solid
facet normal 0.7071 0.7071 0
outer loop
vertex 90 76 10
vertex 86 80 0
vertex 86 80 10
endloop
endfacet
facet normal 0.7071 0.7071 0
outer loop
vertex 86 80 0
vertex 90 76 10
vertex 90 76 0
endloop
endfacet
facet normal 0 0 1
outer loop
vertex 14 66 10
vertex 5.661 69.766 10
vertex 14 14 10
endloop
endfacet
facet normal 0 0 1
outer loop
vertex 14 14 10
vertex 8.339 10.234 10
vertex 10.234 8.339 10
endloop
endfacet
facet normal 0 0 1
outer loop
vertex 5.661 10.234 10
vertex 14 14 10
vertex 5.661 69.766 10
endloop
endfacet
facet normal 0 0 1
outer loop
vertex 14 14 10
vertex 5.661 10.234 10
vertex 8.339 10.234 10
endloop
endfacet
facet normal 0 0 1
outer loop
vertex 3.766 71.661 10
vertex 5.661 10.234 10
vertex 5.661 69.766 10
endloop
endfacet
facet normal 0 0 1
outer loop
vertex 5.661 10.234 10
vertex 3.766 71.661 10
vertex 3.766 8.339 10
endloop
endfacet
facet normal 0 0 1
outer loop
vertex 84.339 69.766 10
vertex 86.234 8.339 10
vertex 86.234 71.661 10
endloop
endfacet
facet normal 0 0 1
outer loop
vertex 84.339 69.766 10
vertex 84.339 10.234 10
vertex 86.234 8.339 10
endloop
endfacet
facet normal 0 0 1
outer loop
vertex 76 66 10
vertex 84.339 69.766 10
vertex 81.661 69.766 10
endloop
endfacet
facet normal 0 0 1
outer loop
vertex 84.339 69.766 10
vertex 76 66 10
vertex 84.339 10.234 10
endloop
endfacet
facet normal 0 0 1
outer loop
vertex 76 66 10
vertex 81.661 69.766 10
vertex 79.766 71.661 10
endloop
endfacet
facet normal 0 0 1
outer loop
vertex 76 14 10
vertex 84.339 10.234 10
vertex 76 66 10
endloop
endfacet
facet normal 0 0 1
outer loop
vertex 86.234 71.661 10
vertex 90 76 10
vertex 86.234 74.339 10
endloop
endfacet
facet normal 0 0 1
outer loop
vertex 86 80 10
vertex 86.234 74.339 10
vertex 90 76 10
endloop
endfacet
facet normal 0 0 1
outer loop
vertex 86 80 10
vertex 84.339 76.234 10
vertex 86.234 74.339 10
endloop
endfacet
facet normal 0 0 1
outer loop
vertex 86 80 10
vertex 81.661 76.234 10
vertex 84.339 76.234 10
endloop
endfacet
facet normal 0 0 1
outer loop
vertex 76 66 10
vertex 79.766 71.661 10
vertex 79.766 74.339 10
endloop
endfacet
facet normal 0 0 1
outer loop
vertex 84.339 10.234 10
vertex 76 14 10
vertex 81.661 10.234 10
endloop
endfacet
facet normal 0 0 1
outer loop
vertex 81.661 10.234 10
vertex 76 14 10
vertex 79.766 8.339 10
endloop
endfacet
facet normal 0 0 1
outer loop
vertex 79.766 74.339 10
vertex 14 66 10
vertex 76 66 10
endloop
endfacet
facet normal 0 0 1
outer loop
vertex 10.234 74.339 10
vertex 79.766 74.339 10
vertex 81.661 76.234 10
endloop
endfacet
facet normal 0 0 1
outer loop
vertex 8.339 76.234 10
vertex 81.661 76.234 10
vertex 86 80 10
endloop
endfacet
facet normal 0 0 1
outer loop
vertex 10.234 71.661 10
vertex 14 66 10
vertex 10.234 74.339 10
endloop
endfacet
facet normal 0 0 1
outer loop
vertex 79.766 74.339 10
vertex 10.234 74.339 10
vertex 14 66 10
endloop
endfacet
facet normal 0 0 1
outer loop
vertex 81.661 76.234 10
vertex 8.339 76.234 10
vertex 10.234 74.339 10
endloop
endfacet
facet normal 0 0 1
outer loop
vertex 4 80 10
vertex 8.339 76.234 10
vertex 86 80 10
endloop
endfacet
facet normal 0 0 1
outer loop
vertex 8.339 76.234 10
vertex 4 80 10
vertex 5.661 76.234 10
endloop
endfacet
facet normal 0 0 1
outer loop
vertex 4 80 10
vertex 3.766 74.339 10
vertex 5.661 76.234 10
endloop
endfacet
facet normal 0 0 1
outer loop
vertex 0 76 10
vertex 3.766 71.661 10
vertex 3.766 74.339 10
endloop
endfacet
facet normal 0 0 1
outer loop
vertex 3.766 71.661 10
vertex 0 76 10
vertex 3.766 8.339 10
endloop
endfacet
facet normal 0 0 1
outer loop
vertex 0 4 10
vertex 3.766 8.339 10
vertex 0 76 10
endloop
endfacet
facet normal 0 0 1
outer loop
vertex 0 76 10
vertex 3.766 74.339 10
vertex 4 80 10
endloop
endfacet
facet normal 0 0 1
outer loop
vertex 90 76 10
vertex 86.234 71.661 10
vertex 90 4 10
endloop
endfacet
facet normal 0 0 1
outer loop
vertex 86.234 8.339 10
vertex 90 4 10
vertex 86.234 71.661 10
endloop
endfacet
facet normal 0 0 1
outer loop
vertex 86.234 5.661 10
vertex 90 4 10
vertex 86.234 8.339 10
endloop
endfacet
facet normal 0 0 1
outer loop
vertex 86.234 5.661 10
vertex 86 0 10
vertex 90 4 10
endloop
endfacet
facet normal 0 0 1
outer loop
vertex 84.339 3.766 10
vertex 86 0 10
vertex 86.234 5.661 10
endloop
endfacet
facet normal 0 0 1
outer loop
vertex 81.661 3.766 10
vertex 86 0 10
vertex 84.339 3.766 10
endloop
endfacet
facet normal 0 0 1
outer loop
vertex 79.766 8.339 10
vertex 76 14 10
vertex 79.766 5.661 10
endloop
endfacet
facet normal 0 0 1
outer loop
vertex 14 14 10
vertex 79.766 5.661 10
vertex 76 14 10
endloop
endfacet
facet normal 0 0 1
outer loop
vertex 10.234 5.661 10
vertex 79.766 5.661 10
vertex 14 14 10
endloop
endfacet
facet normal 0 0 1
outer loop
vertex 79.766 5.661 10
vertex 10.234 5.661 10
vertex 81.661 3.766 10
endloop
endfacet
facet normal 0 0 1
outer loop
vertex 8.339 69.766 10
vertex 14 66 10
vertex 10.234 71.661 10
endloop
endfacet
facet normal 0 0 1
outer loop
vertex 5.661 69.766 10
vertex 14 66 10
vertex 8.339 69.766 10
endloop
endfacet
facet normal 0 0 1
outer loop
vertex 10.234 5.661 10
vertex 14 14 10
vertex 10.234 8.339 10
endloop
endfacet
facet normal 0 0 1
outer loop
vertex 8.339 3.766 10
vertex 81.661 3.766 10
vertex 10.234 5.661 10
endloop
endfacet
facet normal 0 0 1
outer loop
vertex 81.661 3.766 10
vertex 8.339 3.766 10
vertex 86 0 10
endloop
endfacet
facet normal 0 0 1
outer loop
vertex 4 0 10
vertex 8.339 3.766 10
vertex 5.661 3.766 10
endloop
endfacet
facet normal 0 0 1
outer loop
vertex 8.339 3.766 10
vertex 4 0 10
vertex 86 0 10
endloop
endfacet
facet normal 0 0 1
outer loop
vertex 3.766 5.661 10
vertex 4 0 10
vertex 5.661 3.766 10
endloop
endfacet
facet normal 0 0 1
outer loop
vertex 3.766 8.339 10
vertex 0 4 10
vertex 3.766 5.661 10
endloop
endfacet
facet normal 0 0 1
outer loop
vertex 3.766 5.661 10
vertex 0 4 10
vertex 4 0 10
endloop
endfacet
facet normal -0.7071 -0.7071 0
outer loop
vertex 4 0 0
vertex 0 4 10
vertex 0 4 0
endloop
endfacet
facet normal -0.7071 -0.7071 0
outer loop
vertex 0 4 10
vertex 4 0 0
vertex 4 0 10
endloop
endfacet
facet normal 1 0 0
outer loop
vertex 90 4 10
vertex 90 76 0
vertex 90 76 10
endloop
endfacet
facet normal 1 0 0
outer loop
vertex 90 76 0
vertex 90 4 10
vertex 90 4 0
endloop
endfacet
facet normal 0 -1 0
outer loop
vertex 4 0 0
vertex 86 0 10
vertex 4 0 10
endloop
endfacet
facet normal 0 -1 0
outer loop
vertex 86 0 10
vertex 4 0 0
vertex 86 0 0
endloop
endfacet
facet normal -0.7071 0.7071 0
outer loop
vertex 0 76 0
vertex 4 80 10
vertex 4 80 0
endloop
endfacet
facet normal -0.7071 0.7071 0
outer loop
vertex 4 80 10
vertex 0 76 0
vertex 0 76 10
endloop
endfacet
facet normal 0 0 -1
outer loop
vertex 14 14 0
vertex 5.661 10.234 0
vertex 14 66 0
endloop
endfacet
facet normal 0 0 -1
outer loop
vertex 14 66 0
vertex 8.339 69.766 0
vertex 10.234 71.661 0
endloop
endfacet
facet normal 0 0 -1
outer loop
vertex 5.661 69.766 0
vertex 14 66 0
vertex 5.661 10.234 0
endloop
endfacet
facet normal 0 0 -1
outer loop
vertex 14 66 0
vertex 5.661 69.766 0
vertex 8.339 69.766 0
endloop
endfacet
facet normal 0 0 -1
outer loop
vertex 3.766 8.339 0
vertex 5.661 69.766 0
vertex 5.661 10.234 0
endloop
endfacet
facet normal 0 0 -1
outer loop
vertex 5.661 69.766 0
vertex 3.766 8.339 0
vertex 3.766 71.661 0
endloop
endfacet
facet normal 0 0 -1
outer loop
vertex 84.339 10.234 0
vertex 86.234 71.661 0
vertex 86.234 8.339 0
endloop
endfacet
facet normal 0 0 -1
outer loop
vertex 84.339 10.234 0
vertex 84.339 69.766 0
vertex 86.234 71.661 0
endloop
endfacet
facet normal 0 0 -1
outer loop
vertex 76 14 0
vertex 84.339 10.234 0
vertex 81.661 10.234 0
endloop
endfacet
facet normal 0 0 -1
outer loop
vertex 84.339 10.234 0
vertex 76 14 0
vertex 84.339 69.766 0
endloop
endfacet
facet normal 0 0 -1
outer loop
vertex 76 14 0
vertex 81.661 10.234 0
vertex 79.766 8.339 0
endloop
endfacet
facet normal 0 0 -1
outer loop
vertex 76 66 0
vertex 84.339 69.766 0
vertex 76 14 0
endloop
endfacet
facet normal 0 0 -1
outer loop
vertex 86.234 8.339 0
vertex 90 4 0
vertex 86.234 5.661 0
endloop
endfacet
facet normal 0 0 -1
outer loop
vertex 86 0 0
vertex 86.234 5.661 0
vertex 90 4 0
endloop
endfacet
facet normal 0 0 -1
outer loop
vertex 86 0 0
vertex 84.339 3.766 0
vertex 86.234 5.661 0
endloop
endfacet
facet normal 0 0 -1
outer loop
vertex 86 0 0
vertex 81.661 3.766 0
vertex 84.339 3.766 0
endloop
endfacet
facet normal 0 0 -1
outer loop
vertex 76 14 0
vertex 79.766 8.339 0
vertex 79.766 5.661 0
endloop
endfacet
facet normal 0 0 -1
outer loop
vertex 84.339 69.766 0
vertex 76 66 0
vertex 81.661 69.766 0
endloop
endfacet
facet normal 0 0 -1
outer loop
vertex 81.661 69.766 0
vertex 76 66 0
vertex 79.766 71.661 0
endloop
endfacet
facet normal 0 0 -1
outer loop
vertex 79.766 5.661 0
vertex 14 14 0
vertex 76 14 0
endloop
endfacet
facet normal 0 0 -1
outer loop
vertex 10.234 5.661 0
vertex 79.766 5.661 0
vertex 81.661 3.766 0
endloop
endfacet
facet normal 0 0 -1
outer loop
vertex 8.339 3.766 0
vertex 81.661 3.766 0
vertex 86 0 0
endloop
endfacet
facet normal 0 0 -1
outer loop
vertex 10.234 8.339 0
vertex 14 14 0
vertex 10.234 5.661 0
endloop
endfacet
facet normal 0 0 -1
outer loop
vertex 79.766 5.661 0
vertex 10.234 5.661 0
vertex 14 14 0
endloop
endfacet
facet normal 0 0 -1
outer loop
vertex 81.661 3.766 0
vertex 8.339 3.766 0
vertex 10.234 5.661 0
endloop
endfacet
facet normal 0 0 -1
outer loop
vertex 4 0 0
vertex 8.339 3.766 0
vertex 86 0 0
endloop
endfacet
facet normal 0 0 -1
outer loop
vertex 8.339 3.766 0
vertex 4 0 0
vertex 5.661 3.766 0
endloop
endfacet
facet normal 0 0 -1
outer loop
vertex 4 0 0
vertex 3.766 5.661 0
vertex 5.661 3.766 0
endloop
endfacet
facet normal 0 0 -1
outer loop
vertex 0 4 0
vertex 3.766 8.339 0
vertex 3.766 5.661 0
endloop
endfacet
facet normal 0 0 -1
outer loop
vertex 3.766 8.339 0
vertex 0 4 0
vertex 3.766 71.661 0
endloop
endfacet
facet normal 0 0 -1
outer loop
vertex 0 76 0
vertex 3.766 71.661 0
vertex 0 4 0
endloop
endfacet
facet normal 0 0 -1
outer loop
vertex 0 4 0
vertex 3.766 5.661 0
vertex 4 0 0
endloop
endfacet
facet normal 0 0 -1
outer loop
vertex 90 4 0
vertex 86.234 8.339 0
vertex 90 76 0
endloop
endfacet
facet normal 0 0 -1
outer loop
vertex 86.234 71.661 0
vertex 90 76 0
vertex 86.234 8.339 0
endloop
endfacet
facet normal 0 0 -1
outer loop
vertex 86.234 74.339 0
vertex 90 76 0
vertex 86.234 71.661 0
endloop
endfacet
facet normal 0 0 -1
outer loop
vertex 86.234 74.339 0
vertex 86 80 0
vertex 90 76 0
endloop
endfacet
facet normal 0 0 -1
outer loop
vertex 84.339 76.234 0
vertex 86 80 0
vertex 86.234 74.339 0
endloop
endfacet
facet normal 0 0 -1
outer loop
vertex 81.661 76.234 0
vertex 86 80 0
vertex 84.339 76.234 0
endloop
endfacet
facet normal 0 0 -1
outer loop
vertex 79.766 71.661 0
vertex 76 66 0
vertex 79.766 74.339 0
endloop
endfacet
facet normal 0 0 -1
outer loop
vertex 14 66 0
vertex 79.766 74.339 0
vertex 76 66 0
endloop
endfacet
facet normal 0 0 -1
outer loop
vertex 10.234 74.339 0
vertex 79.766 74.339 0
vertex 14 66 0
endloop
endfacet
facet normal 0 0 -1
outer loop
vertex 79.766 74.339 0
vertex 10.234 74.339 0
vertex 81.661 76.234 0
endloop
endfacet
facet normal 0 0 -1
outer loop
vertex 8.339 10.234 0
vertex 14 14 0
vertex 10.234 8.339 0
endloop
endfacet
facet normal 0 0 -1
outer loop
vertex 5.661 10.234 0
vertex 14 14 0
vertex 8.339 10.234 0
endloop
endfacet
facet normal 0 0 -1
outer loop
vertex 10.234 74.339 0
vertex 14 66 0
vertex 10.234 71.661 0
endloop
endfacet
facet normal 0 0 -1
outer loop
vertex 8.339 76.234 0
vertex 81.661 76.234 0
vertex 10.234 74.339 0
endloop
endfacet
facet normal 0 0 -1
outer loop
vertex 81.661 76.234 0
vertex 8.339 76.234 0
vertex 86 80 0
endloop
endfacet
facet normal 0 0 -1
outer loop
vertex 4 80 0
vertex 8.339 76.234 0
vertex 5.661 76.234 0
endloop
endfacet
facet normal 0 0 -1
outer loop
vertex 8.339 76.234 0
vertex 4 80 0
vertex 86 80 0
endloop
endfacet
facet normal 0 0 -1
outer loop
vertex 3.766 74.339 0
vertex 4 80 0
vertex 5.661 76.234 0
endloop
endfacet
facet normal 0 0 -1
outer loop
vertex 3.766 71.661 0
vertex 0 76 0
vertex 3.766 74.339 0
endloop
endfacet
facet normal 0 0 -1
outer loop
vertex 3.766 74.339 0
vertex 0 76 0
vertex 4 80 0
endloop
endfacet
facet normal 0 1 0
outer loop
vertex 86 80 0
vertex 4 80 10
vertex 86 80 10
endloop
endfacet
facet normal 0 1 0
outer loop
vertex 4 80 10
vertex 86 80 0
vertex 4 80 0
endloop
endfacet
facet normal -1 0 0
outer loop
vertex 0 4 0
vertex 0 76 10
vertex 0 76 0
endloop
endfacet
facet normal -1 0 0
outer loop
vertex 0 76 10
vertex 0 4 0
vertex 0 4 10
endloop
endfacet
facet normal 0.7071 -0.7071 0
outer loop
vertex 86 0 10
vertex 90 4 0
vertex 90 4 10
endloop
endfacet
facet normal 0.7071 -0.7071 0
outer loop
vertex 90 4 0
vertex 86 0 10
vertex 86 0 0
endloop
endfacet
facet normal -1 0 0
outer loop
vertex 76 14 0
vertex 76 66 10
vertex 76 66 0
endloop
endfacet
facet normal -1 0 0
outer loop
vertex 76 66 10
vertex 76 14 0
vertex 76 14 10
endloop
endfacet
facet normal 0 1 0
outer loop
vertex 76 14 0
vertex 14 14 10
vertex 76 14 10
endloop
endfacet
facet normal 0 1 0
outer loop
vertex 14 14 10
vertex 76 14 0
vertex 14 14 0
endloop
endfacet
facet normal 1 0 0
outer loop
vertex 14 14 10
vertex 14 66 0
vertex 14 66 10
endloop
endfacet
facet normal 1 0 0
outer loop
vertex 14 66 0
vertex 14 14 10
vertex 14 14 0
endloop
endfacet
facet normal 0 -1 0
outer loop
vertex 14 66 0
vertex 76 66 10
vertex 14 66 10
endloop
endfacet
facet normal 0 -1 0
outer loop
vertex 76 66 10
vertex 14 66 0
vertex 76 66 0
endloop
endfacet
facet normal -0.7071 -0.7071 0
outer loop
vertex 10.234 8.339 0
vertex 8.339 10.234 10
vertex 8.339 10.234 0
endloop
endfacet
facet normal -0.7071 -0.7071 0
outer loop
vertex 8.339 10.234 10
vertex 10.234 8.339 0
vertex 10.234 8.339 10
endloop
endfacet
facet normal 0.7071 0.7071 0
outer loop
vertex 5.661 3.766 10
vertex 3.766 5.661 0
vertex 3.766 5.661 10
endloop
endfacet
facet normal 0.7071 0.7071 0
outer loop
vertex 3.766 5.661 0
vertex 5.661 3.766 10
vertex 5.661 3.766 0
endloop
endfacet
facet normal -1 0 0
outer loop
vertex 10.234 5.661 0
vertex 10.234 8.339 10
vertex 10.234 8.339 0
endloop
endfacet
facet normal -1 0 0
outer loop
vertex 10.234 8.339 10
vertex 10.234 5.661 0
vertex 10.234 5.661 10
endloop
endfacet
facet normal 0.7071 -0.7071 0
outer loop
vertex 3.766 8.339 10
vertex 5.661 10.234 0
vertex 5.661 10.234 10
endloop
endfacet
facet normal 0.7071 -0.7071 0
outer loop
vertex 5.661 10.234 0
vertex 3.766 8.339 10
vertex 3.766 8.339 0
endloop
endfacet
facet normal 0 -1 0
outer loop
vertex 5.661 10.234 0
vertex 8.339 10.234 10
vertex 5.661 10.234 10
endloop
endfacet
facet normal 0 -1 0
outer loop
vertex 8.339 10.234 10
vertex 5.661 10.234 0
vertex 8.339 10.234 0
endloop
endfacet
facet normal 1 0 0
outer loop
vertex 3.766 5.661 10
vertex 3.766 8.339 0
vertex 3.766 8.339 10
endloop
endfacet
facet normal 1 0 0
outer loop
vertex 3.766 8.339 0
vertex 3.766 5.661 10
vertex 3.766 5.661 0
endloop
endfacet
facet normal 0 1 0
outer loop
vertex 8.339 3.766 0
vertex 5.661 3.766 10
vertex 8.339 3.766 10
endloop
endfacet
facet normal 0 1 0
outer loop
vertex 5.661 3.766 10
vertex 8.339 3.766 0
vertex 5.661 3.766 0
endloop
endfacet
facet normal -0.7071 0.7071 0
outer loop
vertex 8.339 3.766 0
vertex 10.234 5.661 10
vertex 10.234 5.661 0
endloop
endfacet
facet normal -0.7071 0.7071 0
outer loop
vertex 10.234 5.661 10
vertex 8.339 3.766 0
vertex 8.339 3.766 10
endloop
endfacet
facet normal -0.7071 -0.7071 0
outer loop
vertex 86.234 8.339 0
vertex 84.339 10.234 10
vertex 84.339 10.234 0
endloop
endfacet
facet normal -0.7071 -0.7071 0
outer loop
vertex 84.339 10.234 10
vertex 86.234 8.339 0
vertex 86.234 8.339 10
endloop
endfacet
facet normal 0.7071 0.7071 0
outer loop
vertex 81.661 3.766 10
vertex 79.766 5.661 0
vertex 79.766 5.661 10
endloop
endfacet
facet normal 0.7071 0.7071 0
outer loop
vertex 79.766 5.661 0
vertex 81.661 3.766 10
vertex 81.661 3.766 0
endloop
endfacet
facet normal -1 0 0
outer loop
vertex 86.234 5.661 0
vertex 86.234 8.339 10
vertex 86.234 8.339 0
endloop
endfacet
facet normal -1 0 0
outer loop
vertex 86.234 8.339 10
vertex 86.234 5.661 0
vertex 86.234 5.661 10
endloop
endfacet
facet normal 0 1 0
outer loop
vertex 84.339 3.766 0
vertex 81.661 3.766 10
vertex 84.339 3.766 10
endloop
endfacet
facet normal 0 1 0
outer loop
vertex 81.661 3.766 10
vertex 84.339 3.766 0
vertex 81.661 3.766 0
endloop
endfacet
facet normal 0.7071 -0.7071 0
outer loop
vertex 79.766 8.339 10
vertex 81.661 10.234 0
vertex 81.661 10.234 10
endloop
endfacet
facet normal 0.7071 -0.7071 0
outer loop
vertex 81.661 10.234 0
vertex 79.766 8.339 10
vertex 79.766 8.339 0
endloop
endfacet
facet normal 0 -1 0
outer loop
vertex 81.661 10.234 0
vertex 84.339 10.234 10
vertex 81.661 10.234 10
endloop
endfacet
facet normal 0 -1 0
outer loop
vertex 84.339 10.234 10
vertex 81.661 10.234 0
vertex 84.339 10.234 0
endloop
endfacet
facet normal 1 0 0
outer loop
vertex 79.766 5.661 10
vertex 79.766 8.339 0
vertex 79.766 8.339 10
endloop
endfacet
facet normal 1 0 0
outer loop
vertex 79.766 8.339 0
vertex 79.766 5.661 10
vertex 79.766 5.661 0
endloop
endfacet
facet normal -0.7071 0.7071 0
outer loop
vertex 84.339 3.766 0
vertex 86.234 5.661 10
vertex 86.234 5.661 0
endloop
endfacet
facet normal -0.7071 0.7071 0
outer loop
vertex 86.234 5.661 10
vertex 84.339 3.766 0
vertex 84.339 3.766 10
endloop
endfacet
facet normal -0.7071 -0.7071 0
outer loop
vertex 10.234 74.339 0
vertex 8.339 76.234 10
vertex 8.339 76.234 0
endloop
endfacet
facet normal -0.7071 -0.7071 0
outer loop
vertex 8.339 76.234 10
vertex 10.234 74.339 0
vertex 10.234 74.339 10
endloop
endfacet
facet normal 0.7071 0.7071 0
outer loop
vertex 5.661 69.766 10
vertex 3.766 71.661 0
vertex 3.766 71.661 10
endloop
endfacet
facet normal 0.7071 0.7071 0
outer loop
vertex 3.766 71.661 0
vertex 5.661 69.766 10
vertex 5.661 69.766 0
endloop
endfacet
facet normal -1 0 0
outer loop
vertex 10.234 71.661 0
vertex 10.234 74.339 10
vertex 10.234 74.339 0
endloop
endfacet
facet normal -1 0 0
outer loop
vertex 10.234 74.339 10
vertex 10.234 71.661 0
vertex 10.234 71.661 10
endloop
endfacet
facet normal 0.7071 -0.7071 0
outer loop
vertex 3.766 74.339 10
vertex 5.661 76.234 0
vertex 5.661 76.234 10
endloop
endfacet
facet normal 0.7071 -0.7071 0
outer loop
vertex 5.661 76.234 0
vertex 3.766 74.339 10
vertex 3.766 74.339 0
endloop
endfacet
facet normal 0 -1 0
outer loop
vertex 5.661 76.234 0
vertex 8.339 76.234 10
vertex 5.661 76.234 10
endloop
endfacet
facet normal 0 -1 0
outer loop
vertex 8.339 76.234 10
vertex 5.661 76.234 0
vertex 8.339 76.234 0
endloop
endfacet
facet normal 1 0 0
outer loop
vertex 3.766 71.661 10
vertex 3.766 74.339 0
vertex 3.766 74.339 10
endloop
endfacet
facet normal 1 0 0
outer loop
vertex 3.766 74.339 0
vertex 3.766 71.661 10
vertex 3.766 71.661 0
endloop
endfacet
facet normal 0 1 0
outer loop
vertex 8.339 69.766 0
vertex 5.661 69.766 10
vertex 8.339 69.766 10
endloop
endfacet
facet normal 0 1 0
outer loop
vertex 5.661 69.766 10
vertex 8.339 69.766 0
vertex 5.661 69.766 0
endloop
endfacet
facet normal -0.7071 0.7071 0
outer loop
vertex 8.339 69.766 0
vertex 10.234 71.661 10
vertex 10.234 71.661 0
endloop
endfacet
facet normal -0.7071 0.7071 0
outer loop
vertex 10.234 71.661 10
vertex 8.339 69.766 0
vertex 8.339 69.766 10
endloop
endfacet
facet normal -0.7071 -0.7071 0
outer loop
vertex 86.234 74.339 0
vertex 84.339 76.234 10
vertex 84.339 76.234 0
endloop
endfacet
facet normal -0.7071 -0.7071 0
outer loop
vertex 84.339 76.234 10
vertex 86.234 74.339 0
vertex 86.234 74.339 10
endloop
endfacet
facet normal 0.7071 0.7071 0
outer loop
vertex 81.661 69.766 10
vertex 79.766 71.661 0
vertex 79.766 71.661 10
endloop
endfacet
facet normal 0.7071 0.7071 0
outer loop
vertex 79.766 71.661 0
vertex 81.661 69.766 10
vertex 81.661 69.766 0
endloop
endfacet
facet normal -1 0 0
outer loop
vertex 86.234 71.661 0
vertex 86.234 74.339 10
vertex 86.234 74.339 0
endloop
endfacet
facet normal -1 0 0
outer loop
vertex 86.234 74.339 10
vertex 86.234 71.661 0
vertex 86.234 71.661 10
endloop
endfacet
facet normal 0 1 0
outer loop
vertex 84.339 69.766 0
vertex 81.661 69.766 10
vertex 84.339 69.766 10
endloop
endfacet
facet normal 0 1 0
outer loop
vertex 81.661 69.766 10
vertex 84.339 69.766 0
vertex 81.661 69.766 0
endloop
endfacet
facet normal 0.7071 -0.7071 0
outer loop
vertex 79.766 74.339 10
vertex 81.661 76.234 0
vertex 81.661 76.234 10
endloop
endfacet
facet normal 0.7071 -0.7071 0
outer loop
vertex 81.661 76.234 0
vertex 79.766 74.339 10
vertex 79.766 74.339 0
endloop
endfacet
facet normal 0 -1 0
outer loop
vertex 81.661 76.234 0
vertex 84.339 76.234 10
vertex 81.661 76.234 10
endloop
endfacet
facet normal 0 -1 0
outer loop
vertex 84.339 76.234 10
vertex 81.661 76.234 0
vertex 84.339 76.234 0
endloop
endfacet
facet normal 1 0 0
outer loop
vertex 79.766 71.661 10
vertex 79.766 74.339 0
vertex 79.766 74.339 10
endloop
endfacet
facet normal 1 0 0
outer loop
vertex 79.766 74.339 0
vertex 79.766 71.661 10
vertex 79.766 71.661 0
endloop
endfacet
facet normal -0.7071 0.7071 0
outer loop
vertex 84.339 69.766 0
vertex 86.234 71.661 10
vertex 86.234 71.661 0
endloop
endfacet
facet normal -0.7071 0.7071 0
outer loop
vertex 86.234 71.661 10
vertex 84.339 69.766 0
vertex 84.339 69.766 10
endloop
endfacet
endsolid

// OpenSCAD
$fn = 32;

// ----------------------------------------------------------------------
// Frame plate: 90 x 80 frame, 14 mm rails
// ----------------------------------------------------------------------

// --- parameters (mm) ---
plate_l = 90;             // plate length, X
plate_w = 80;             // plate width, Y
plate_t = 10;             // plate thickness, Z (extrusion height)
corner_c = 4;             // corner chamfer
frame_bar = 14;           // frame rail width
bolt_r = 3.5;             // corner bolt window radius
bolt_inset = 7;           // bolt centre inset from the edges

win_l = plate_l - 2 * frame_bar;  // window length
win_w = plate_w - 2 * frame_bar;  // window width
bolt_d = 2 * bolt_r;  // corner hole diameter

profile = [[4, 0], [86, 0], [90, 4], [90, 76], [86, 80], [4, 80], [0, 76], [0, 4]];  // primary outline, 8 points, counter clockwise
void_1 = [[14, 14], [76, 14], [76, 66], [14, 66]];  // the window, 4 points
void_2 = [[10.234, 8.339], [8.339, 10.234], [5.661, 10.234], [3.766, 8.339], [3.766, 5.661], [5.661, 3.766], [8.339, 3.766], [10.234, 5.661]];  // corner bolt window, 8 points
void_3 = [[86.234, 8.339], [84.339, 10.234], [81.661, 10.234], [79.766, 8.339], [79.766, 5.661], [81.661, 3.766], [84.339, 3.766], [86.234, 5.661]];  // corner bolt window, 8 points
void_4 = [[10.234, 74.339], [8.339, 76.234], [5.661, 76.234], [3.766, 74.339], [3.766, 71.661], [5.661, 69.766], [8.339, 69.766], [10.234, 71.661]];  // corner bolt window, 8 points
void_5 = [[86.234, 74.339], [84.339, 76.234], [81.661, 76.234], [79.766, 74.339], [79.766, 71.661], [81.661, 69.766], [84.339, 69.766], [86.234, 71.661]];  // corner bolt window, 8 points

// --- the one profile operation ---
difference() {
  linear_extrude(height = plate_t) polygon(points = profile);
  translate([0, 0, -1])
    linear_extrude(height = plate_t + 2) polygon(points = void_1);
  translate([0, 0, -1])
    linear_extrude(height = plate_t + 2) polygon(points = void_2);
  translate([0, 0, -1])
    linear_extrude(height = plate_t + 2) polygon(points = void_3);
  translate([0, 0, -1])
    linear_extrude(height = plate_t + 2) polygon(points = void_4);
  translate([0, 0, -1])
    linear_extrude(height = plate_t + 2) polygon(points = void_5);
}
